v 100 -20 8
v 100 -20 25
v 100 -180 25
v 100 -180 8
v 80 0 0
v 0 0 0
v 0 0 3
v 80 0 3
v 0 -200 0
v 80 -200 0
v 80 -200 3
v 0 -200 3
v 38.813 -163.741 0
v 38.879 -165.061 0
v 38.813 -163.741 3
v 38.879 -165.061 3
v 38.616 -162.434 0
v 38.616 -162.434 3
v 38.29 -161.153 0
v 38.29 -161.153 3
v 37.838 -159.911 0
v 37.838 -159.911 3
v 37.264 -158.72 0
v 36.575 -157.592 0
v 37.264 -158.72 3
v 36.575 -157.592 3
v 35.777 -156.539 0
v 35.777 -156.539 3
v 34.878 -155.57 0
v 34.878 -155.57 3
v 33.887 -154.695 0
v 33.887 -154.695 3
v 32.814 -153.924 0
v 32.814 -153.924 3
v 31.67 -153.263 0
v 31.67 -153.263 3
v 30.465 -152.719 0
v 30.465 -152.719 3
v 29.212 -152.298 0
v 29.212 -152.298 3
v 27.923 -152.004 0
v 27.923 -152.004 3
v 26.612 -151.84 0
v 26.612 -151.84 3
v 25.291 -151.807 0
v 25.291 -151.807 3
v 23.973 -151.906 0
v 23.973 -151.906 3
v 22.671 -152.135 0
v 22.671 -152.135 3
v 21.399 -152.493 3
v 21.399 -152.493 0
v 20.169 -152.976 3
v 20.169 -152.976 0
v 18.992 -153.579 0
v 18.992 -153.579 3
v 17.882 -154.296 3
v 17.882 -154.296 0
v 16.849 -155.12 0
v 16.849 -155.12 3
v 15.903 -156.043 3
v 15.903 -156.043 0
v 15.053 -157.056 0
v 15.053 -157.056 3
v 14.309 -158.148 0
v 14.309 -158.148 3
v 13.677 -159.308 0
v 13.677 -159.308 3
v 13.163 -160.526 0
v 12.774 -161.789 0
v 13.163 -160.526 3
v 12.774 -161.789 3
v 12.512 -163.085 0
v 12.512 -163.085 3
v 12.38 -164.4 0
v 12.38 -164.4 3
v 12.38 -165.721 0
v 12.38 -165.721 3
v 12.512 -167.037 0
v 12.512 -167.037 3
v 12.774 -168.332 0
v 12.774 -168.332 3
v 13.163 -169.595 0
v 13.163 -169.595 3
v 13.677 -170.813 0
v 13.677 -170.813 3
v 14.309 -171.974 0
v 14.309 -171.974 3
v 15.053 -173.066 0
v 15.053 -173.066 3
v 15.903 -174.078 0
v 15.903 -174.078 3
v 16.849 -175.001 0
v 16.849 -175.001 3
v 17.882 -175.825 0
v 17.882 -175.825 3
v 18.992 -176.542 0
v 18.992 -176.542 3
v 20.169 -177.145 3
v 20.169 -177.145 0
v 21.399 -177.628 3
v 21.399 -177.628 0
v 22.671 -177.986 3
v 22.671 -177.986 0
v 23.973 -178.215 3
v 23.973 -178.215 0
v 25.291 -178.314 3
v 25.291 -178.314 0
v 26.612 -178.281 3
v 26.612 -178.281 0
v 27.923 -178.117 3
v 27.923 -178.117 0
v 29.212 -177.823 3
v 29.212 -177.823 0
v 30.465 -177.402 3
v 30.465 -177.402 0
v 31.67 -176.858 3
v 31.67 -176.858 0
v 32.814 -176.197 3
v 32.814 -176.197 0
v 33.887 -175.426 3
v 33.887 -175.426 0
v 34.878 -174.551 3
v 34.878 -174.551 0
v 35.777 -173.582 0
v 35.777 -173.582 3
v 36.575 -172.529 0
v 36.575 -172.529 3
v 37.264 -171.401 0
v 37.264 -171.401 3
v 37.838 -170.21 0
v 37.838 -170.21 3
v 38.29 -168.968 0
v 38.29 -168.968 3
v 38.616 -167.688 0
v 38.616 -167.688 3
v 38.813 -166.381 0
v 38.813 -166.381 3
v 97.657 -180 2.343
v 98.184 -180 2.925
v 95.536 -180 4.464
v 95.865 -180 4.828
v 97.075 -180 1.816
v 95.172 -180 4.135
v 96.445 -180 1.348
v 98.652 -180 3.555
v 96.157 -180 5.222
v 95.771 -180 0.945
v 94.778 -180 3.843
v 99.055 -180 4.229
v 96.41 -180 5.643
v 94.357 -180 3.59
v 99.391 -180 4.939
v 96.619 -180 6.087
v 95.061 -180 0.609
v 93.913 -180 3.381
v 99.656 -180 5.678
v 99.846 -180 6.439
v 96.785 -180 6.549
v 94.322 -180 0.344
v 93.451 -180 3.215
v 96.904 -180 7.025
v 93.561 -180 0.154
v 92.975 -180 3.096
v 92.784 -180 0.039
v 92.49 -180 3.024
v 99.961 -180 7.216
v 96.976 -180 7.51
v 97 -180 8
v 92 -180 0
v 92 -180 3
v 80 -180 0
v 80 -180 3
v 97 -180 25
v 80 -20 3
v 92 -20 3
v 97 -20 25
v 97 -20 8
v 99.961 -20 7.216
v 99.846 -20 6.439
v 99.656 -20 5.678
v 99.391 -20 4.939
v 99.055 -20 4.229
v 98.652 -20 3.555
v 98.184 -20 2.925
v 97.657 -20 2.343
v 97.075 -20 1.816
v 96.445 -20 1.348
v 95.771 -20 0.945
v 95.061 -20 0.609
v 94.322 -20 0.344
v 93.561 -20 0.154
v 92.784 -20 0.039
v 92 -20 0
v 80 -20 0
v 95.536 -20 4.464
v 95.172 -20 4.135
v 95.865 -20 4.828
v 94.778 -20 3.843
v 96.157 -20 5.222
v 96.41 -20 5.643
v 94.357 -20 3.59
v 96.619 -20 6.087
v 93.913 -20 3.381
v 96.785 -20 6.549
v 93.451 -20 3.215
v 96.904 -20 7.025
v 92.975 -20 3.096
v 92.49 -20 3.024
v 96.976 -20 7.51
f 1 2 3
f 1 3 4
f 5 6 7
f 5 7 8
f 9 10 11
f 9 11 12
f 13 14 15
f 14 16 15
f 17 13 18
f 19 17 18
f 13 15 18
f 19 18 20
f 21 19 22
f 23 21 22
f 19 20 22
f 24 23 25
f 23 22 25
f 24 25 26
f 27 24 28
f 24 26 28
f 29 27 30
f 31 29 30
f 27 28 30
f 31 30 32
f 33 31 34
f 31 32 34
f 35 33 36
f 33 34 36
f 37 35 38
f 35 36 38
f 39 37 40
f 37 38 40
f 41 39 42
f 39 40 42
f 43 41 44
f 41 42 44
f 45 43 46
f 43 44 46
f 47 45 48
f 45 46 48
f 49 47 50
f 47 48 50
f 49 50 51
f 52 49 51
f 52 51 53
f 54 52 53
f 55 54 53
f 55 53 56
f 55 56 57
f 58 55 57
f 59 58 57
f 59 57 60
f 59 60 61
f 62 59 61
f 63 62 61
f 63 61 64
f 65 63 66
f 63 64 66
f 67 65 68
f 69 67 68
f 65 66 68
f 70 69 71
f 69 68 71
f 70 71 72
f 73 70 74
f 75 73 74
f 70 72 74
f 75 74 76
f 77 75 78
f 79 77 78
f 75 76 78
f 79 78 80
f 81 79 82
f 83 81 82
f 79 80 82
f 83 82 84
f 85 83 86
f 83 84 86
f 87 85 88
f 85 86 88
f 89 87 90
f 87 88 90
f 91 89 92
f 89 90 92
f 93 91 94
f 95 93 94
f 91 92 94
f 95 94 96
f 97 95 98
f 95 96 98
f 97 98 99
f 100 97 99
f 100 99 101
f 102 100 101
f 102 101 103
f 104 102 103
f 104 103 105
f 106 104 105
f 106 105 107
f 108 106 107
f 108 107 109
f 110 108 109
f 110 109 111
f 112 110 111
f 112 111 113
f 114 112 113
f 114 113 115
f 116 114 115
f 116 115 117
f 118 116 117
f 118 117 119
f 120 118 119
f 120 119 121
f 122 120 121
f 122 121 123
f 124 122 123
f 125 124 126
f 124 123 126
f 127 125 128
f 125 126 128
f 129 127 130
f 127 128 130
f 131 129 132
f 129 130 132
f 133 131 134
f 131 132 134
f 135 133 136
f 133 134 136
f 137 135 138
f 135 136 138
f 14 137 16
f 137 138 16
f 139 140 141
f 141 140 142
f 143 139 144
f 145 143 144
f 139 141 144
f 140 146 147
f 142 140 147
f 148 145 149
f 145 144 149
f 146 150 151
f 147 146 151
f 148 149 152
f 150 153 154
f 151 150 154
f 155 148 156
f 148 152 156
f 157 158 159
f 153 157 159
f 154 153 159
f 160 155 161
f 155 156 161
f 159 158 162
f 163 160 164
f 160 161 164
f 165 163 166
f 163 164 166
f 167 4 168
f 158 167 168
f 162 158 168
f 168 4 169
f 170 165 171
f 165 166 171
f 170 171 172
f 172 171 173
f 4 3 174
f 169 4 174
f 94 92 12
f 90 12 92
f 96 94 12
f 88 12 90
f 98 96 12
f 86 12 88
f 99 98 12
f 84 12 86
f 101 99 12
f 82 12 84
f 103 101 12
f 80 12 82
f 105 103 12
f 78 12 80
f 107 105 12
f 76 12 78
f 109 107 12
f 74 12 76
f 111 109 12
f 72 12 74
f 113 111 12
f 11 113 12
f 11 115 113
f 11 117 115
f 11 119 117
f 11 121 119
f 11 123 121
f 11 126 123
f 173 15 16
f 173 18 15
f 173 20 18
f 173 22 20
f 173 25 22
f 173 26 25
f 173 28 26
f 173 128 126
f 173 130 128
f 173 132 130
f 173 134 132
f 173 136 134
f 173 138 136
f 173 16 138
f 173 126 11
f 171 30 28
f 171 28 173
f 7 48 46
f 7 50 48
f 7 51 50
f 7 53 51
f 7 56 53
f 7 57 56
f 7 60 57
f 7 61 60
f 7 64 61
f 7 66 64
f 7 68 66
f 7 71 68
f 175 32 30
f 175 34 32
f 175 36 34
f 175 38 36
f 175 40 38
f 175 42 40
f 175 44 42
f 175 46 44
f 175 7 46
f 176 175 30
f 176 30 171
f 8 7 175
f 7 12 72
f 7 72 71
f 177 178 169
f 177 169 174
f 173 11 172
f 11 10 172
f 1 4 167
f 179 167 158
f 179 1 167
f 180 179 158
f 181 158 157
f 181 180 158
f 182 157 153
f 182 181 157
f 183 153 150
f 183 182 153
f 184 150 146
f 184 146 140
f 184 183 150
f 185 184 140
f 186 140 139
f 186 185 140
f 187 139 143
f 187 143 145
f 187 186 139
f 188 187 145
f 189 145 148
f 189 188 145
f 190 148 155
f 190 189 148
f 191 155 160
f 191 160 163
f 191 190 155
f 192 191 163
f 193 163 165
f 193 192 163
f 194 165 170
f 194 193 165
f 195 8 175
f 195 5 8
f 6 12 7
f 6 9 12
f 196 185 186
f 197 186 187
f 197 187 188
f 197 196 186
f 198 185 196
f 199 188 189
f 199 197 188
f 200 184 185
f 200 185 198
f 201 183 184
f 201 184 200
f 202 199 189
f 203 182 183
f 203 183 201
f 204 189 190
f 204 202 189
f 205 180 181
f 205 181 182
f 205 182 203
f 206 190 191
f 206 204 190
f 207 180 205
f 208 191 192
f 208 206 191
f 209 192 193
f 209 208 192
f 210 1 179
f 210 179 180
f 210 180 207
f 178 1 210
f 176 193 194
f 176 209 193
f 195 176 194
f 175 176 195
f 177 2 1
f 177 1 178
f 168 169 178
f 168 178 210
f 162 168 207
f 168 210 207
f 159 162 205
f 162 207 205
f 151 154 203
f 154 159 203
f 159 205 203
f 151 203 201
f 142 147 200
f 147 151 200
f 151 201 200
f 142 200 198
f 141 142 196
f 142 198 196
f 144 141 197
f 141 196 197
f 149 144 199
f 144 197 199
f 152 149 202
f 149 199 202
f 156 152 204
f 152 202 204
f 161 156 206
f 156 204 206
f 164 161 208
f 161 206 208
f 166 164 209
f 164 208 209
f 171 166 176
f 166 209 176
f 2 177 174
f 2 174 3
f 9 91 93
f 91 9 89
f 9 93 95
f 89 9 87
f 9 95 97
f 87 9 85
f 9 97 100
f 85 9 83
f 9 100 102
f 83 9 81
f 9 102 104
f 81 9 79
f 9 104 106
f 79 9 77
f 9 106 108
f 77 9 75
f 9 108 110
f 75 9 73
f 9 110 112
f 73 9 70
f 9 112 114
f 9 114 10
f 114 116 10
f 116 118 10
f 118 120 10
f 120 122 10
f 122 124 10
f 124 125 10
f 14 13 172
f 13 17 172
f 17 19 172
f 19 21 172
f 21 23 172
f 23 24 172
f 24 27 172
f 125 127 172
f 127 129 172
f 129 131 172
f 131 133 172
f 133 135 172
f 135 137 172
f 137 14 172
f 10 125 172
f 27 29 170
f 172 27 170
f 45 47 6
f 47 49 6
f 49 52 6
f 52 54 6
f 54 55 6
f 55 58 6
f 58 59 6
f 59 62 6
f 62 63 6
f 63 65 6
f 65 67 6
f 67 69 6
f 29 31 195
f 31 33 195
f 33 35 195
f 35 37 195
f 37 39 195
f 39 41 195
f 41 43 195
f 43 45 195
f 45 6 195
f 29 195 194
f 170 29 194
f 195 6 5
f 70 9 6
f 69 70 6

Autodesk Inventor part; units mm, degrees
ref_plane "YZ Plane" through (0, 0, 0) normal (1, 0, 0) x (0, 1, 0)
ref_plane "XZ Plane" through (0, 0, 0) normal (0, 1, 0) x (-1, 0, 0)
ref_plane "XY Plane" through (0, 0, 0) normal (0, 0, 1) x (1, 0, 0)
sketch "Sketch7" plane through (0, 0, 0) normal (0, 0, 1) x (1, 0, 0)
  line L0 (0, 0) -> (100, 0)
  line L1 (100, 0) -> (100, -200)
  line L2 (100, -200) -> (0, -200)
  line L3 (0, -200) -> (0, 0)
  line L4 (100, 0) -> (80, 0)
  line L5 (80, 0) -> (80, -20)
  line L6 (80, -20) -> (100, -20)
  line L7 (100, -20) -> (100, 0)
  line L8 (100, -200) -> (80, -200)
  line L9 (80, -200) -> (80, -180)
  line L10 (80, -180) -> (100, -180)
  line L11 (100, -180) -> (100, -200)
  dimension "d23" = 100
  dimension "d24" = 200
  dimension "d25" = 20
  dimension "d26" = 20
extrude "Plate3" add sketch "Sketch7" along normal blind 3 contours L0 L5 L6 L1 L10 L9 L2 L3
sketch "Sketch8" plane through (0, 0, 3) normal (0, 0, 1) x (1, 0, 0)
  line L0 (6.2166, -35.2952) -> (70.6562, -35.2952) construction
  line L1 (70.6562, -35.2952) -> (70.6562, -48.8117) construction
  line L2 (70.6562, -48.8117) -> (6.2166, -48.8117) construction
  line L3 (6.2166, -48.8117) -> (6.2166, -35.2952) construction
  point P0 (0, 0)
mark "Mark2"
sketch "Sketch9" plane through (0, -200, 3) normal (0, 0, 1) x (1, 0, 0)
  circle A0 centre (25.6213, 34.9394) radius 13.2577
  point P0 (0, 200)
extrude "Cut1" cut sketch "Sketch9" against normal blind 3
sketch "Sketch10" plane through (0, 0, 0) normal (0, 0, -1) x (-1, 0, 0)
  line L0 (-87.8036, -108.5191) -> (-55.956, -108.5191) construction
  line L1 (-55.956, -108.5191) -> (-55.956, -118.5191) construction
  line L2 (-55.956, -118.5191) -> (-87.8036, -118.5191) construction
  line L3 (-87.8036, -118.5191) -> (-87.8036, -108.5191) construction
  point P0 (0, 0)
mark "Mark3"
sketch "Sketch11" plane through (97, -20, 0) normal (1, 0, 0) x (0, 1, 0)
  line L0 (-160, 0) -> (0, 0)
  line L1 (0, 0) -> (0, 25)
  line L2 (0, 25) -> (-160, 25)
  line L3 (-160, 25) -> (-160, 0)
edge flange "Flange2" height 25 angle 90 thickness 3 bend radius 5 thickness toward (1, 0, 0) relief round relief width 3 relief depth 1.5 edges at (100, -100, 3) wall of the first edge with corners at (97, -180, 0) (97, -20, 0) (97, -20, 25) (97, -180, 25)
bend "Bend2"
corner "Corner2"
equation "\"d28\" = Thickness"
equation "\"d27\" = Thickness"
equation "\"d30\" = BendReliefWidth"
equation "\"d31\" = BendReliefDepth"
equation "\"d32\" = MinimumRemnant"
equation "\"d33\" = TransitionRadius"
equation "\"d36\" = BendRadius"
equation "\"d37\" = CornerReliefSize"
equation "\"d38\" = GapSize"
equation "\"d39\" = JacobiRadiusSize"
equation "\"BendReliefWidth\" = Thickness"
equation "\"BendReliefDepth\" = 0.5 * Thickness"
equation "\"CornerReliefSize\" = 4 * Thickness"
equation "\"MinimumRemnant\" = 2 * Thickness"
equation "\"TransitionRadius\" = BendRadius"
equation "\"JacobiRadiusSize\" = BendRadius"
equation "\"GapSize\" = Thickness"
equation "\"Thickness\" = 3"
equation "\"BendRadius\" = 5"
properties material "Stainless Steel"
